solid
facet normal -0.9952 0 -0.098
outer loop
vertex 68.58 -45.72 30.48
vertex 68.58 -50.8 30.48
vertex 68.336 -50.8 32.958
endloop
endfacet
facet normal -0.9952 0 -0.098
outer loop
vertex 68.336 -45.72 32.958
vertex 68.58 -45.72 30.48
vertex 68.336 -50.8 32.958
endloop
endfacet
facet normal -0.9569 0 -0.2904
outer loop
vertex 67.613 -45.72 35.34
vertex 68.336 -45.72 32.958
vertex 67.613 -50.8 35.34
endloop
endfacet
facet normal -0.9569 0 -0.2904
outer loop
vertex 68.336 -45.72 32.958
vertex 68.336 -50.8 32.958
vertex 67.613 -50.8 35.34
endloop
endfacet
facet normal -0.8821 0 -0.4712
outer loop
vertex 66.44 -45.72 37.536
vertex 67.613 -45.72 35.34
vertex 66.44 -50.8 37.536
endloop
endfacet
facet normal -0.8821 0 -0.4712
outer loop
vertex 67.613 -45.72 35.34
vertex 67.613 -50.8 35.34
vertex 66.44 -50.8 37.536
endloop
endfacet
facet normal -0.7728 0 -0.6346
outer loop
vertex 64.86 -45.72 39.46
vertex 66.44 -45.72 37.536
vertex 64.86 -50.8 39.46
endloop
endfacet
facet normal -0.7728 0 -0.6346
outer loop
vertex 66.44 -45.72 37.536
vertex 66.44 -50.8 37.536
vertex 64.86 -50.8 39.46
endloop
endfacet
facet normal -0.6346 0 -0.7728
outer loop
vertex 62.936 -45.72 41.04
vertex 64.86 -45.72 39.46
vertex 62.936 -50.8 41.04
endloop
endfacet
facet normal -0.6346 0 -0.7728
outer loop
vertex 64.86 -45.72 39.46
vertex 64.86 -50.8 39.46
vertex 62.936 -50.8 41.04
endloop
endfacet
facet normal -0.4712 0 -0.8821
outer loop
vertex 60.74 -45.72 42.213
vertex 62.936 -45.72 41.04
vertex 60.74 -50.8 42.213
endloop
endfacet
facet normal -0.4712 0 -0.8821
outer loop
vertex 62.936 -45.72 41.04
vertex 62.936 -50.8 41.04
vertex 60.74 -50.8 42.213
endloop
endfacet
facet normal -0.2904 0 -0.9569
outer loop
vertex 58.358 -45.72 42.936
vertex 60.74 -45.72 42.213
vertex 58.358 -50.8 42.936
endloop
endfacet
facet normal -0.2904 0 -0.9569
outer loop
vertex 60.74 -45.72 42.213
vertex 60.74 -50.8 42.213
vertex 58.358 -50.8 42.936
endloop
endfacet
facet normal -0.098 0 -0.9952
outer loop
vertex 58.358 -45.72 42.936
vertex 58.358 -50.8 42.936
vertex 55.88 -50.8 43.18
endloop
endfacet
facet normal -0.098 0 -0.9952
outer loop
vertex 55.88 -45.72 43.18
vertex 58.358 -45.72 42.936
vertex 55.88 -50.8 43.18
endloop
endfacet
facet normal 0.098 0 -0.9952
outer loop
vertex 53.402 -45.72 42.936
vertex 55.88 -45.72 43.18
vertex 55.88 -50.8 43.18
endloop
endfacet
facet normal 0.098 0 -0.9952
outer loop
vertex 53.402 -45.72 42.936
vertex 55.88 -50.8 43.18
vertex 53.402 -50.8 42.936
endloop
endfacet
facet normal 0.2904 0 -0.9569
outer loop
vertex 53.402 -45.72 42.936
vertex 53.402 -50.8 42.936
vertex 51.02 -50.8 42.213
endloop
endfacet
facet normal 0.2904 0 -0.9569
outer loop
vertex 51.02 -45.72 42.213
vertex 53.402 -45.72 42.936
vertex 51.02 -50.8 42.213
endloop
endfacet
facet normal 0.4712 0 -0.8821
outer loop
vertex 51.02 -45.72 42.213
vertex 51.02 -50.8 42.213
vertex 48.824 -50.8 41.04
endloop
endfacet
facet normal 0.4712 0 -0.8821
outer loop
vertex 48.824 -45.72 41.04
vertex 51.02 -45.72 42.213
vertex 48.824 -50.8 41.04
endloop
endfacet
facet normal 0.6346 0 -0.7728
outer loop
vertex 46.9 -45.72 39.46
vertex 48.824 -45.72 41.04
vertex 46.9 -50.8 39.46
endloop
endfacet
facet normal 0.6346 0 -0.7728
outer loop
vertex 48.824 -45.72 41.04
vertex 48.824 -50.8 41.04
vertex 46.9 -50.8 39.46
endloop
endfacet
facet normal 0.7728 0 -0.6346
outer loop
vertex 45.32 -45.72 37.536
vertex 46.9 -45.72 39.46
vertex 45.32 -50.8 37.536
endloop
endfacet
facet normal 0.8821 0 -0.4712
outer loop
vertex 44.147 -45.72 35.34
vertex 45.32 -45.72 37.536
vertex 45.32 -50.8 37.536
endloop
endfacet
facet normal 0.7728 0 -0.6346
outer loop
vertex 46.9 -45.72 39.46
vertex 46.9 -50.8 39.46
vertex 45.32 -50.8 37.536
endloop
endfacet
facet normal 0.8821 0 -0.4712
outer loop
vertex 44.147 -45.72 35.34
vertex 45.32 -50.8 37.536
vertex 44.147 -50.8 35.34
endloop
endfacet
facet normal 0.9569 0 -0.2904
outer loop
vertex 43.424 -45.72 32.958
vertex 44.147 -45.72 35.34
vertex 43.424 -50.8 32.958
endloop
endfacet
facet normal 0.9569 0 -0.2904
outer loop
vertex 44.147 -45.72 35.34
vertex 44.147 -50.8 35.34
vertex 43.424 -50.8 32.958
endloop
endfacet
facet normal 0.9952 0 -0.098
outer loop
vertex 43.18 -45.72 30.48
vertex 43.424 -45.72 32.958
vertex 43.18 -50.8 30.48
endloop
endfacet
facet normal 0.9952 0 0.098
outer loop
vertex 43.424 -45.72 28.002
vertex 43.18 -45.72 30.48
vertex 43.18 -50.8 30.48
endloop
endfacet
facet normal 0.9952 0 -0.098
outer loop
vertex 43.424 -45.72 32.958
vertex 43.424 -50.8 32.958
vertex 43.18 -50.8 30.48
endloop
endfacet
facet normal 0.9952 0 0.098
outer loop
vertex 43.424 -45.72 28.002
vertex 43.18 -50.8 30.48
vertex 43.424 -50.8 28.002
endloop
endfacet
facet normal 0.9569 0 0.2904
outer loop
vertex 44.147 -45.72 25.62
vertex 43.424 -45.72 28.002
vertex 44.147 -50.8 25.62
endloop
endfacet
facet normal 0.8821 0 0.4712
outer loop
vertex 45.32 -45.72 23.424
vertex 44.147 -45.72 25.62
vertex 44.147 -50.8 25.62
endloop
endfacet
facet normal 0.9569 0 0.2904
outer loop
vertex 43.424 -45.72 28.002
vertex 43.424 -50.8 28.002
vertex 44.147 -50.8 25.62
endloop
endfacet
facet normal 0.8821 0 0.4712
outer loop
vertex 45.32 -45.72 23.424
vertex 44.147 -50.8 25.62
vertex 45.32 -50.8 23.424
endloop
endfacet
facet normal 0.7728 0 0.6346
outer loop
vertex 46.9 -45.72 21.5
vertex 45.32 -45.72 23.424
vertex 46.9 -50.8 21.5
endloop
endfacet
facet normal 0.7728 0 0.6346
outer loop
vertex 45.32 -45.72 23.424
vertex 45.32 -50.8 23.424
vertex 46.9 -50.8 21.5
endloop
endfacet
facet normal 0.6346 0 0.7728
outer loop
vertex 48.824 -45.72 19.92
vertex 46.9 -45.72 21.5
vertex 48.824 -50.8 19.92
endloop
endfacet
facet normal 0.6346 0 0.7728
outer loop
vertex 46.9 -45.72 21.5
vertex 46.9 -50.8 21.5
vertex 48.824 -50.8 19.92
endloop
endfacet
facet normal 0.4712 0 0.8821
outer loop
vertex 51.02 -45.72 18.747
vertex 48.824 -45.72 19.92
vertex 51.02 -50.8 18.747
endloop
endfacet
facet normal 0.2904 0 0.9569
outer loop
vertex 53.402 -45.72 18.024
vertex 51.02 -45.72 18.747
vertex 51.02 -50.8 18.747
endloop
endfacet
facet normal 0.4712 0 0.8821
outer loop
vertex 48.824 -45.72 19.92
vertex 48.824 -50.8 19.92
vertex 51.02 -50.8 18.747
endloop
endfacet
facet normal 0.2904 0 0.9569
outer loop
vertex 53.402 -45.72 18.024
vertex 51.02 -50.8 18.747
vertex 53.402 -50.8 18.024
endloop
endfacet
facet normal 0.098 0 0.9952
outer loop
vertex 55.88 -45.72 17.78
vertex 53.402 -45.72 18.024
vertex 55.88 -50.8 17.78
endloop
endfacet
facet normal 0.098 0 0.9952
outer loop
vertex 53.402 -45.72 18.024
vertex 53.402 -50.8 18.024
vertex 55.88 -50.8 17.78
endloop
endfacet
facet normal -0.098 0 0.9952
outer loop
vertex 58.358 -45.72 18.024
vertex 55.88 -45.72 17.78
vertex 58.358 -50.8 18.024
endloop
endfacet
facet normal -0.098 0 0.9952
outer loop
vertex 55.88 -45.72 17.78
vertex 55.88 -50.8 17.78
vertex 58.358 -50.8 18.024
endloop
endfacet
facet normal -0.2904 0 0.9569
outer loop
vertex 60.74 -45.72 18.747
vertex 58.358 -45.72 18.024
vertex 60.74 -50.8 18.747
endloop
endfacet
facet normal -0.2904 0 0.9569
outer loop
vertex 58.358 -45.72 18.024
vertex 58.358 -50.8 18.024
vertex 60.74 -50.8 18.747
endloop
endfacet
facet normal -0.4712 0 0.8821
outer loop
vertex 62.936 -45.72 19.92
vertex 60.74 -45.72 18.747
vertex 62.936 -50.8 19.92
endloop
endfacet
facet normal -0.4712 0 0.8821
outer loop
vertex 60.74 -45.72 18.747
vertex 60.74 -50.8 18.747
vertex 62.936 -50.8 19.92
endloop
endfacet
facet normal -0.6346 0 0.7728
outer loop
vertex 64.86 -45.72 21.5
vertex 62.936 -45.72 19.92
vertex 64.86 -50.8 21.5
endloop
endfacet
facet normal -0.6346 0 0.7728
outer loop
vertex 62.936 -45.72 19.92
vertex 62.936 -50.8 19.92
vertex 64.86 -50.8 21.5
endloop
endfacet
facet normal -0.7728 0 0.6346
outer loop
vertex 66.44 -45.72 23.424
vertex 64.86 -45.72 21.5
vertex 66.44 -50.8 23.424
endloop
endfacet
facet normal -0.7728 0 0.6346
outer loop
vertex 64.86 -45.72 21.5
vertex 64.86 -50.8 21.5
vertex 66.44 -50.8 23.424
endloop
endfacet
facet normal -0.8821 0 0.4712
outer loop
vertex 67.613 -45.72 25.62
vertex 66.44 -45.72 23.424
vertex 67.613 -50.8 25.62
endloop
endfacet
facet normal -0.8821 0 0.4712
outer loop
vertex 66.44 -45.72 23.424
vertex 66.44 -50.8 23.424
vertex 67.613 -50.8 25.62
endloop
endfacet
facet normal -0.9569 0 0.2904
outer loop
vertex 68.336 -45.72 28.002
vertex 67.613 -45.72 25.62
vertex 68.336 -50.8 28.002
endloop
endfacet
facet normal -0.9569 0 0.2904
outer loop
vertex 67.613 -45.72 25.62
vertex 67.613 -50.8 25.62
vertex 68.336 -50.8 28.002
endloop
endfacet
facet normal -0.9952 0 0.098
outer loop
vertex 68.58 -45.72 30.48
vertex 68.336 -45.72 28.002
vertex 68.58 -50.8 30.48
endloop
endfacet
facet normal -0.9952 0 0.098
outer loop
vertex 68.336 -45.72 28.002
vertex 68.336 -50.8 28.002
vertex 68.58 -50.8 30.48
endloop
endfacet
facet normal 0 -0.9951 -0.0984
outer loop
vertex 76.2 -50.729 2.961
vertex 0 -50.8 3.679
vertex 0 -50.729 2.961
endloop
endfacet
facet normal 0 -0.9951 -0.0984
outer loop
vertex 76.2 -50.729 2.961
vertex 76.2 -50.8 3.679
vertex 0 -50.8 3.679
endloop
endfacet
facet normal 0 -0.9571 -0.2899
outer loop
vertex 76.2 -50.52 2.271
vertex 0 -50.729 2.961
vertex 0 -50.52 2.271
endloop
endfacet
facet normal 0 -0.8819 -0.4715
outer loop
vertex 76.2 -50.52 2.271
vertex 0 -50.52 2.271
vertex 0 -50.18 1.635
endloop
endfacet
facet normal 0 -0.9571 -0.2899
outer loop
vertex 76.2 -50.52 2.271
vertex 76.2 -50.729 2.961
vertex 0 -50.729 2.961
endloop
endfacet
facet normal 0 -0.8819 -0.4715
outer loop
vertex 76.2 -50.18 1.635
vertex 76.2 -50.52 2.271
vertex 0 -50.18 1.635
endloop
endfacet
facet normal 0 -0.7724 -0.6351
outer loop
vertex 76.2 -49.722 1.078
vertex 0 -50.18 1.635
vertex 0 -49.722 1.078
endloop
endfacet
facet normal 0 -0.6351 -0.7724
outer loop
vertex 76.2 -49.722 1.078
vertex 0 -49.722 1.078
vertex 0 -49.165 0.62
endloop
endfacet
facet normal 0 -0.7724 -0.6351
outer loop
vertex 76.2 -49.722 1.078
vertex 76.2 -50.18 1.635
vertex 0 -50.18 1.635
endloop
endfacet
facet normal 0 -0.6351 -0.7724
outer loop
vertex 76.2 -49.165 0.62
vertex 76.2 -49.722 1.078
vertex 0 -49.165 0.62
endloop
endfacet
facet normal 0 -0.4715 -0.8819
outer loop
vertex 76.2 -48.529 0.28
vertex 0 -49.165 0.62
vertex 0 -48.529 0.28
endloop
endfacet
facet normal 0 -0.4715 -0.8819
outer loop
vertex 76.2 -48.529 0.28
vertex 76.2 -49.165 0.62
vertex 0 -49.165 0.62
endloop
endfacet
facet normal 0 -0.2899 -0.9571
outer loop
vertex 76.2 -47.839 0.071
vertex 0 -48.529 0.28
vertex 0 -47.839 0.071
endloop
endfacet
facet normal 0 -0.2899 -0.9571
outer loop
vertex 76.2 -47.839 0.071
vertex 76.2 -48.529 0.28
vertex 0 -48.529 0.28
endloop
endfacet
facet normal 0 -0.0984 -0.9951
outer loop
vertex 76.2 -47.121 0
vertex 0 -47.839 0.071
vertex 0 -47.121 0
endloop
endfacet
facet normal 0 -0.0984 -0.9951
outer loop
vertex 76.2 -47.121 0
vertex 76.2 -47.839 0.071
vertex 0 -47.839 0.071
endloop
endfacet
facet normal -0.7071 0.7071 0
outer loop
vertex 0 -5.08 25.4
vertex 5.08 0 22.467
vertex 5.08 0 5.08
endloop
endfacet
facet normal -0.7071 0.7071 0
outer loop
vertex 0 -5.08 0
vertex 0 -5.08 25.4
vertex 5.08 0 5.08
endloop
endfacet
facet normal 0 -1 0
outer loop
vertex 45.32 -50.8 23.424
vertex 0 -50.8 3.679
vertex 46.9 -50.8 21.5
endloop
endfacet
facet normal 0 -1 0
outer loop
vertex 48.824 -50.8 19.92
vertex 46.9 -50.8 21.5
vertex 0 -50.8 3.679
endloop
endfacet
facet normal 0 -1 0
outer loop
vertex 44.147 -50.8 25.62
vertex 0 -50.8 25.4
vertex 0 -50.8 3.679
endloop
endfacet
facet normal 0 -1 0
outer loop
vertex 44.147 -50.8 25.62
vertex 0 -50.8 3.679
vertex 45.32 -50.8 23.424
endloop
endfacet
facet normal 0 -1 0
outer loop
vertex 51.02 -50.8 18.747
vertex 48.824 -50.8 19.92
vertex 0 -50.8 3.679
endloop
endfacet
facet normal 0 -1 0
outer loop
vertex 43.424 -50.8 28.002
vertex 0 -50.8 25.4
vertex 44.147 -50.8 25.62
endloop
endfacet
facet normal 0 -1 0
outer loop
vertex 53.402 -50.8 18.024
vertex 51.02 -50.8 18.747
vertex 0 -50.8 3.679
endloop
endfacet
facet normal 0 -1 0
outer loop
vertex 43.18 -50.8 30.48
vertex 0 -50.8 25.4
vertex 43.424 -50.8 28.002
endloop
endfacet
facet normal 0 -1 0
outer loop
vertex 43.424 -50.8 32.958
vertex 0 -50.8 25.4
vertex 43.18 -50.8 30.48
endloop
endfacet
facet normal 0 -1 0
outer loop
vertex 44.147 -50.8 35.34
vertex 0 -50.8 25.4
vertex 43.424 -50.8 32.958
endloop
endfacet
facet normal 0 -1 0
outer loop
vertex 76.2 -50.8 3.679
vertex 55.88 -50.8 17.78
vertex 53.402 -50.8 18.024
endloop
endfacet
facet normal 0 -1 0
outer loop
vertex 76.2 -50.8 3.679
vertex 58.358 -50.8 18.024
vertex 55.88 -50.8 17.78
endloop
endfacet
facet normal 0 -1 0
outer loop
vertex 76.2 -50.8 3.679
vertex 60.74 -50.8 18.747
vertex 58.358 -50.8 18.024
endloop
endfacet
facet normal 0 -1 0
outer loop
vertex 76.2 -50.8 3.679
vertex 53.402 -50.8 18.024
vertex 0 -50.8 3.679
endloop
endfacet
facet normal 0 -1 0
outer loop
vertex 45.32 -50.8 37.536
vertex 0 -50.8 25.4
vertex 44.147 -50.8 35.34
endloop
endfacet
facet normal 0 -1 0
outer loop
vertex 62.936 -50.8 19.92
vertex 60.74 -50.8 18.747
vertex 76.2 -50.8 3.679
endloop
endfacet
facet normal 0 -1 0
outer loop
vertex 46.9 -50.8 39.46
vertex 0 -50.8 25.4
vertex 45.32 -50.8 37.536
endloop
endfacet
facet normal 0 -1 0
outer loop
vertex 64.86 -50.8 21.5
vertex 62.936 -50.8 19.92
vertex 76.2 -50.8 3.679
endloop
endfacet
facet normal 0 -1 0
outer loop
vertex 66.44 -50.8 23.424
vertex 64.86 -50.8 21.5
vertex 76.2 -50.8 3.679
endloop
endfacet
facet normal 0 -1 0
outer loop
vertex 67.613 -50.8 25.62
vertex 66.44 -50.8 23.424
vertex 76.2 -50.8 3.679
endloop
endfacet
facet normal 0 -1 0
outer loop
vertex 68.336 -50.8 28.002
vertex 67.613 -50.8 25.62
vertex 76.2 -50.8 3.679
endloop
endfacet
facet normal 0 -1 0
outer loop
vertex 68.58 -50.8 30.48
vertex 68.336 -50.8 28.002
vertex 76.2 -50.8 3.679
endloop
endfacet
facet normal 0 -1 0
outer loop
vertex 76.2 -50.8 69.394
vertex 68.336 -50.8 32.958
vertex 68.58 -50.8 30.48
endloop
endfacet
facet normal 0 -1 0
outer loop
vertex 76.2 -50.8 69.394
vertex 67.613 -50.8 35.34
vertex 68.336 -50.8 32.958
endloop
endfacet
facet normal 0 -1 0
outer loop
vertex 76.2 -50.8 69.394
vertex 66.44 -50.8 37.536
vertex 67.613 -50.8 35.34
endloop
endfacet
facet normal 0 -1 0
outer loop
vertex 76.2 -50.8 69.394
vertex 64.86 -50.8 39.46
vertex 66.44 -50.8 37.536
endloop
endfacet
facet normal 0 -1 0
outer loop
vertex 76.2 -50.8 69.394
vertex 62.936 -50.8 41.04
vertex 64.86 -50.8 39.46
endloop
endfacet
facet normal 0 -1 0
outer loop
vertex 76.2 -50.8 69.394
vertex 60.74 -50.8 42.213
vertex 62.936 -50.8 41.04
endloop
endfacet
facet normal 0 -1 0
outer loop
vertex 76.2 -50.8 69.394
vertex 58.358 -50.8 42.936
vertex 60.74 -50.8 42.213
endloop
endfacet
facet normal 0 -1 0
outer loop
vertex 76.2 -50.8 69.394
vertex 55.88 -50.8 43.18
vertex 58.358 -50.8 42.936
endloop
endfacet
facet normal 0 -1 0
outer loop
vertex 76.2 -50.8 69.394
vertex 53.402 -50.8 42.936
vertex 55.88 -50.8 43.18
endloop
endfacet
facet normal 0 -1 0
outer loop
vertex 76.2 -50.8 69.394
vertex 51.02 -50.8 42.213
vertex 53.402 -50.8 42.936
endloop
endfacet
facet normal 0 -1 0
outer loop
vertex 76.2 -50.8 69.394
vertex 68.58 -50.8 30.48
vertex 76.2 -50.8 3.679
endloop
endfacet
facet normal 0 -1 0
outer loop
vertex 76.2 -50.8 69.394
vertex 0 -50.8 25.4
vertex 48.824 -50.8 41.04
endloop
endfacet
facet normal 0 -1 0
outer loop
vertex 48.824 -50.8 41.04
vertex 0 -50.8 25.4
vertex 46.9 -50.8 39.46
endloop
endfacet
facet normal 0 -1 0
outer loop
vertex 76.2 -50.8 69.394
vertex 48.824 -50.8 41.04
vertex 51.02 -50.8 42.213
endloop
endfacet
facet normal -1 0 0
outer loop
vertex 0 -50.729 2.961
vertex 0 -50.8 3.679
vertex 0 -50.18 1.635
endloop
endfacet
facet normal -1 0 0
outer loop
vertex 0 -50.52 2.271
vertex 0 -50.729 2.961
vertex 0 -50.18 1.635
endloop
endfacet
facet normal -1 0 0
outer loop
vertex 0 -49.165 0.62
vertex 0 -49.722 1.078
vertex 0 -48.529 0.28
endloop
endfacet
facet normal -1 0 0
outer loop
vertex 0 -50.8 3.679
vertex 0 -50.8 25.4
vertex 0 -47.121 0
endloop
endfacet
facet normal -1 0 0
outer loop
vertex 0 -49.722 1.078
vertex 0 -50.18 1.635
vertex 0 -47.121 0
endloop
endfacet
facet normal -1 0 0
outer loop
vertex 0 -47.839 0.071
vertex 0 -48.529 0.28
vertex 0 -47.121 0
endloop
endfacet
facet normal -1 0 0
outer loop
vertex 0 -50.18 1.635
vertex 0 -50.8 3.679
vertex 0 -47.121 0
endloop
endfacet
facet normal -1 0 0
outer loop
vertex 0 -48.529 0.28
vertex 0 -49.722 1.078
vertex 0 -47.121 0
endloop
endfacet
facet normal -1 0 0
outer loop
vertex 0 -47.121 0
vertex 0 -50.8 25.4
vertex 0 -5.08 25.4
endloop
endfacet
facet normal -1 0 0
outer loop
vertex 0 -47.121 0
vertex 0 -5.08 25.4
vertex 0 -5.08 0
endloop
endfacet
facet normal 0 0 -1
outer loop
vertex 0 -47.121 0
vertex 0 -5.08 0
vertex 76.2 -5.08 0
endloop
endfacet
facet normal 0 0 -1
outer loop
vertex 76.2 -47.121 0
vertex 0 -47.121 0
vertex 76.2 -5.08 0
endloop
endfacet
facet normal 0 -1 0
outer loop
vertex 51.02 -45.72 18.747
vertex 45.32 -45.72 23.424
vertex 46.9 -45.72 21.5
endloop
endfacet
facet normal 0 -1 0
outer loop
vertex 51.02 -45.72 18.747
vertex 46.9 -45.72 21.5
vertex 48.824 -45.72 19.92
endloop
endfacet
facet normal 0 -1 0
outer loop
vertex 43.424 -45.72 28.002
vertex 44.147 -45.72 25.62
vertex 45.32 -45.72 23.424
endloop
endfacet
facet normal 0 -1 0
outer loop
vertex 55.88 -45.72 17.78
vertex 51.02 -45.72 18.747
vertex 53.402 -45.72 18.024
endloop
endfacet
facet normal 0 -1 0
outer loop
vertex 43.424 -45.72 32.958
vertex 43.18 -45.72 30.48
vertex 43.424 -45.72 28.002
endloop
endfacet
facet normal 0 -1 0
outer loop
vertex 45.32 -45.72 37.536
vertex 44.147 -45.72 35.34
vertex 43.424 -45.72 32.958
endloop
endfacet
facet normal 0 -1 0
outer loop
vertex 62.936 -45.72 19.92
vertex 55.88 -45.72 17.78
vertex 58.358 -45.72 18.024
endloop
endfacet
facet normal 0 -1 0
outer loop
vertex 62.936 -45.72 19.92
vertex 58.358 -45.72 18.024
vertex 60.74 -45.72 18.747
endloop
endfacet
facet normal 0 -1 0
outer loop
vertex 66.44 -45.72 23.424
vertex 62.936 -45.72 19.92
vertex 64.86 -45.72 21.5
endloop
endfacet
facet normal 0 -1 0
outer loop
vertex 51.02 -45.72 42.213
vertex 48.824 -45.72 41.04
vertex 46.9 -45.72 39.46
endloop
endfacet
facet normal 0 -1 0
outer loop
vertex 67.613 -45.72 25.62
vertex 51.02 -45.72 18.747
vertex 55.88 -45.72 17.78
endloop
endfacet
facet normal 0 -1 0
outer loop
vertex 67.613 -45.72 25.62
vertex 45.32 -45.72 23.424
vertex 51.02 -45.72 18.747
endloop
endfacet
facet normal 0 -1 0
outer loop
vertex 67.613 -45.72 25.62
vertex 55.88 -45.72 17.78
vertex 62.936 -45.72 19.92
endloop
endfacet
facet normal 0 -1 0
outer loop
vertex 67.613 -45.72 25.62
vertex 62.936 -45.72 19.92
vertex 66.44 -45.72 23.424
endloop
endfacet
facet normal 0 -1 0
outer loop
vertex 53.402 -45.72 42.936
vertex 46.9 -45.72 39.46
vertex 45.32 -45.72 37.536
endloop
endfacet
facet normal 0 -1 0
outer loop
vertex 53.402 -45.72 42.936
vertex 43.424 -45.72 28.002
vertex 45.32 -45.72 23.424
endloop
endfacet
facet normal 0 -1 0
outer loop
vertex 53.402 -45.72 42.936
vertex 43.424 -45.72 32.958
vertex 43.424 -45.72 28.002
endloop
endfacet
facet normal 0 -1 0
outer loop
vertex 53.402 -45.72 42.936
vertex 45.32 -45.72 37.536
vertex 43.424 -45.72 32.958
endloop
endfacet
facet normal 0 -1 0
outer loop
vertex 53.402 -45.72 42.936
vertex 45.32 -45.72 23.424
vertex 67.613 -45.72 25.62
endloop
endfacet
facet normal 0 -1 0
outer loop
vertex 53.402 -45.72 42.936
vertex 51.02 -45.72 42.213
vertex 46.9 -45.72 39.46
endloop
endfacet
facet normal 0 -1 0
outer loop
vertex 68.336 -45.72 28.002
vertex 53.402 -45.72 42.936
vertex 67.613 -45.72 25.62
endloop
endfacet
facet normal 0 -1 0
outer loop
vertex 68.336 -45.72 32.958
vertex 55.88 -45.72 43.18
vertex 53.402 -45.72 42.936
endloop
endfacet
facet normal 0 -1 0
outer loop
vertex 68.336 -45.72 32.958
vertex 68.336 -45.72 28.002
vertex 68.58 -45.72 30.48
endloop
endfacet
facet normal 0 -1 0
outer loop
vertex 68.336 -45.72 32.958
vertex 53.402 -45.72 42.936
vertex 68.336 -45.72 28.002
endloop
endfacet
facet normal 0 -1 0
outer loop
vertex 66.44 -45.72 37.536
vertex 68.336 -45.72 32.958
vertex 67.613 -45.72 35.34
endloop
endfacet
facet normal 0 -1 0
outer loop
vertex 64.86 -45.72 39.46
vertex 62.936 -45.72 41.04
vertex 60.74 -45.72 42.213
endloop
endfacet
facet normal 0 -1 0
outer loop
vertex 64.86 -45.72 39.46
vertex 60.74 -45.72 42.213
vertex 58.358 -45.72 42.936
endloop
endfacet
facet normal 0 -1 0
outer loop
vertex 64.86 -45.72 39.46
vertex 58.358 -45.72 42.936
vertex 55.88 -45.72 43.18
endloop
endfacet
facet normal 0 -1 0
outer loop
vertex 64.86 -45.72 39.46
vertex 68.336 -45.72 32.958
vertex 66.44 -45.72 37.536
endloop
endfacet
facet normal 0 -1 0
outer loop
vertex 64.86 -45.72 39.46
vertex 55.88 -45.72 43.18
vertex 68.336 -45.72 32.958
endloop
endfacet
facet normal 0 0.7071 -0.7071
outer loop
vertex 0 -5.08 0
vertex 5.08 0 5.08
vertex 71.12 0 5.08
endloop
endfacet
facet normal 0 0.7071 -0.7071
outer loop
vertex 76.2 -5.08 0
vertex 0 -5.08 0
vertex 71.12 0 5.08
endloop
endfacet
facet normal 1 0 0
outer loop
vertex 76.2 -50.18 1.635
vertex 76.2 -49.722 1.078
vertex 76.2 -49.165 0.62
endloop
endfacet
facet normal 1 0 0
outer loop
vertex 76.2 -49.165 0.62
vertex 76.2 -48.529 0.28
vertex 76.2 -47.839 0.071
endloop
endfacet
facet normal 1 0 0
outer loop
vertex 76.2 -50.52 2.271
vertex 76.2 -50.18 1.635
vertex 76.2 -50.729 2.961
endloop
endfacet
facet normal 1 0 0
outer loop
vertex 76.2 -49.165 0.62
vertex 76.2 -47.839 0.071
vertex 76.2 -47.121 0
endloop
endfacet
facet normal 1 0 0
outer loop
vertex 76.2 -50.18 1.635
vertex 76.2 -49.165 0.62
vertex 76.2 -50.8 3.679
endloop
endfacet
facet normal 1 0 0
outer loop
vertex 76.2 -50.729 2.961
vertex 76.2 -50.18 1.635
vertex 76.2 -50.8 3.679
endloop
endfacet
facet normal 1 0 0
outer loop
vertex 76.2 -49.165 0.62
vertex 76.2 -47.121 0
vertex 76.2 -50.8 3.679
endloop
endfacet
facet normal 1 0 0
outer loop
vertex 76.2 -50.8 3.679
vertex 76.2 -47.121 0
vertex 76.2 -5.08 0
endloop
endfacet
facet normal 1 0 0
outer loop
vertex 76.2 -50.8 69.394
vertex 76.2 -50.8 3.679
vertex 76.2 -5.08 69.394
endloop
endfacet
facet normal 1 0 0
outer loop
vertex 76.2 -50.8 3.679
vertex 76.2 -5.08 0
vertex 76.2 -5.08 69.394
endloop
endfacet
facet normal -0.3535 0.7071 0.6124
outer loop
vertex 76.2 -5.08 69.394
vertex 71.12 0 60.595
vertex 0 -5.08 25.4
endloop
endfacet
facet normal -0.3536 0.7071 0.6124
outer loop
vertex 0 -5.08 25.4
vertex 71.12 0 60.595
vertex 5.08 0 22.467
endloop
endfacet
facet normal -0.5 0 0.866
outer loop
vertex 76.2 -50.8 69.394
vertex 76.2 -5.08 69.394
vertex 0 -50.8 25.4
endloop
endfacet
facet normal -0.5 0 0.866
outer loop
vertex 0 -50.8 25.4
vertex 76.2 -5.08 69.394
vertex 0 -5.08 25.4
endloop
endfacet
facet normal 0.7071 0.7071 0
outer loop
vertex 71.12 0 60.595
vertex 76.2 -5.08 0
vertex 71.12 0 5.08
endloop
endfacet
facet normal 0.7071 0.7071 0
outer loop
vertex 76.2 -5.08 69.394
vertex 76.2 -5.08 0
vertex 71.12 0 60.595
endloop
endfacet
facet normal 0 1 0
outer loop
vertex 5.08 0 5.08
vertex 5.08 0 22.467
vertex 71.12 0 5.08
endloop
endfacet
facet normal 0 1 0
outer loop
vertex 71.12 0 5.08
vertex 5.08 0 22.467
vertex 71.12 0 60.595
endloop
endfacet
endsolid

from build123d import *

# Parameters (mm, degrees)
F1_DEPTH = 50.8
F2_R     = 12.7
F3_DEPTH = 5.08
F4_SIZE  = 5.08
F5_R     = 3.679261


with BuildPart() as f1:
    # F0 (on Front) → F1 (new body)
    with BuildSketch(Plane.XZ):
        Polygon((0, 25.4), (0, 0), (76.2, 0), (76.2, 69.394091), align=None)
    extrude(amount=F1_DEPTH)

    # F2 (on face) → F3 (cut)
    with BuildSketch(Plane.XZ.offset(50.8)):
        with Locations((55.88, 30.48)):
            Circle(F2_R)
    extrude(amount=-F3_DEPTH, mode=Mode.SUBTRACT)

    # F4
    f4_edges = [f1.edges().sort_by_distance(p)[0] for p in [
        (0, 0, 12.7),
        (38.1, 0, 0),
        (76.2, 0, 34.697045),
        (38.1, 0, 47.397045),
    ]]
    chamfer(f4_edges, length=F4_SIZE)

    # F5
    f5_edges = [f1.edges().sort_by_distance(p)[0] for p in [
        (38.1, -50.8, 0),
    ]]
    fillet(f5_edges, radius=F5_R)


solid = f1.part
